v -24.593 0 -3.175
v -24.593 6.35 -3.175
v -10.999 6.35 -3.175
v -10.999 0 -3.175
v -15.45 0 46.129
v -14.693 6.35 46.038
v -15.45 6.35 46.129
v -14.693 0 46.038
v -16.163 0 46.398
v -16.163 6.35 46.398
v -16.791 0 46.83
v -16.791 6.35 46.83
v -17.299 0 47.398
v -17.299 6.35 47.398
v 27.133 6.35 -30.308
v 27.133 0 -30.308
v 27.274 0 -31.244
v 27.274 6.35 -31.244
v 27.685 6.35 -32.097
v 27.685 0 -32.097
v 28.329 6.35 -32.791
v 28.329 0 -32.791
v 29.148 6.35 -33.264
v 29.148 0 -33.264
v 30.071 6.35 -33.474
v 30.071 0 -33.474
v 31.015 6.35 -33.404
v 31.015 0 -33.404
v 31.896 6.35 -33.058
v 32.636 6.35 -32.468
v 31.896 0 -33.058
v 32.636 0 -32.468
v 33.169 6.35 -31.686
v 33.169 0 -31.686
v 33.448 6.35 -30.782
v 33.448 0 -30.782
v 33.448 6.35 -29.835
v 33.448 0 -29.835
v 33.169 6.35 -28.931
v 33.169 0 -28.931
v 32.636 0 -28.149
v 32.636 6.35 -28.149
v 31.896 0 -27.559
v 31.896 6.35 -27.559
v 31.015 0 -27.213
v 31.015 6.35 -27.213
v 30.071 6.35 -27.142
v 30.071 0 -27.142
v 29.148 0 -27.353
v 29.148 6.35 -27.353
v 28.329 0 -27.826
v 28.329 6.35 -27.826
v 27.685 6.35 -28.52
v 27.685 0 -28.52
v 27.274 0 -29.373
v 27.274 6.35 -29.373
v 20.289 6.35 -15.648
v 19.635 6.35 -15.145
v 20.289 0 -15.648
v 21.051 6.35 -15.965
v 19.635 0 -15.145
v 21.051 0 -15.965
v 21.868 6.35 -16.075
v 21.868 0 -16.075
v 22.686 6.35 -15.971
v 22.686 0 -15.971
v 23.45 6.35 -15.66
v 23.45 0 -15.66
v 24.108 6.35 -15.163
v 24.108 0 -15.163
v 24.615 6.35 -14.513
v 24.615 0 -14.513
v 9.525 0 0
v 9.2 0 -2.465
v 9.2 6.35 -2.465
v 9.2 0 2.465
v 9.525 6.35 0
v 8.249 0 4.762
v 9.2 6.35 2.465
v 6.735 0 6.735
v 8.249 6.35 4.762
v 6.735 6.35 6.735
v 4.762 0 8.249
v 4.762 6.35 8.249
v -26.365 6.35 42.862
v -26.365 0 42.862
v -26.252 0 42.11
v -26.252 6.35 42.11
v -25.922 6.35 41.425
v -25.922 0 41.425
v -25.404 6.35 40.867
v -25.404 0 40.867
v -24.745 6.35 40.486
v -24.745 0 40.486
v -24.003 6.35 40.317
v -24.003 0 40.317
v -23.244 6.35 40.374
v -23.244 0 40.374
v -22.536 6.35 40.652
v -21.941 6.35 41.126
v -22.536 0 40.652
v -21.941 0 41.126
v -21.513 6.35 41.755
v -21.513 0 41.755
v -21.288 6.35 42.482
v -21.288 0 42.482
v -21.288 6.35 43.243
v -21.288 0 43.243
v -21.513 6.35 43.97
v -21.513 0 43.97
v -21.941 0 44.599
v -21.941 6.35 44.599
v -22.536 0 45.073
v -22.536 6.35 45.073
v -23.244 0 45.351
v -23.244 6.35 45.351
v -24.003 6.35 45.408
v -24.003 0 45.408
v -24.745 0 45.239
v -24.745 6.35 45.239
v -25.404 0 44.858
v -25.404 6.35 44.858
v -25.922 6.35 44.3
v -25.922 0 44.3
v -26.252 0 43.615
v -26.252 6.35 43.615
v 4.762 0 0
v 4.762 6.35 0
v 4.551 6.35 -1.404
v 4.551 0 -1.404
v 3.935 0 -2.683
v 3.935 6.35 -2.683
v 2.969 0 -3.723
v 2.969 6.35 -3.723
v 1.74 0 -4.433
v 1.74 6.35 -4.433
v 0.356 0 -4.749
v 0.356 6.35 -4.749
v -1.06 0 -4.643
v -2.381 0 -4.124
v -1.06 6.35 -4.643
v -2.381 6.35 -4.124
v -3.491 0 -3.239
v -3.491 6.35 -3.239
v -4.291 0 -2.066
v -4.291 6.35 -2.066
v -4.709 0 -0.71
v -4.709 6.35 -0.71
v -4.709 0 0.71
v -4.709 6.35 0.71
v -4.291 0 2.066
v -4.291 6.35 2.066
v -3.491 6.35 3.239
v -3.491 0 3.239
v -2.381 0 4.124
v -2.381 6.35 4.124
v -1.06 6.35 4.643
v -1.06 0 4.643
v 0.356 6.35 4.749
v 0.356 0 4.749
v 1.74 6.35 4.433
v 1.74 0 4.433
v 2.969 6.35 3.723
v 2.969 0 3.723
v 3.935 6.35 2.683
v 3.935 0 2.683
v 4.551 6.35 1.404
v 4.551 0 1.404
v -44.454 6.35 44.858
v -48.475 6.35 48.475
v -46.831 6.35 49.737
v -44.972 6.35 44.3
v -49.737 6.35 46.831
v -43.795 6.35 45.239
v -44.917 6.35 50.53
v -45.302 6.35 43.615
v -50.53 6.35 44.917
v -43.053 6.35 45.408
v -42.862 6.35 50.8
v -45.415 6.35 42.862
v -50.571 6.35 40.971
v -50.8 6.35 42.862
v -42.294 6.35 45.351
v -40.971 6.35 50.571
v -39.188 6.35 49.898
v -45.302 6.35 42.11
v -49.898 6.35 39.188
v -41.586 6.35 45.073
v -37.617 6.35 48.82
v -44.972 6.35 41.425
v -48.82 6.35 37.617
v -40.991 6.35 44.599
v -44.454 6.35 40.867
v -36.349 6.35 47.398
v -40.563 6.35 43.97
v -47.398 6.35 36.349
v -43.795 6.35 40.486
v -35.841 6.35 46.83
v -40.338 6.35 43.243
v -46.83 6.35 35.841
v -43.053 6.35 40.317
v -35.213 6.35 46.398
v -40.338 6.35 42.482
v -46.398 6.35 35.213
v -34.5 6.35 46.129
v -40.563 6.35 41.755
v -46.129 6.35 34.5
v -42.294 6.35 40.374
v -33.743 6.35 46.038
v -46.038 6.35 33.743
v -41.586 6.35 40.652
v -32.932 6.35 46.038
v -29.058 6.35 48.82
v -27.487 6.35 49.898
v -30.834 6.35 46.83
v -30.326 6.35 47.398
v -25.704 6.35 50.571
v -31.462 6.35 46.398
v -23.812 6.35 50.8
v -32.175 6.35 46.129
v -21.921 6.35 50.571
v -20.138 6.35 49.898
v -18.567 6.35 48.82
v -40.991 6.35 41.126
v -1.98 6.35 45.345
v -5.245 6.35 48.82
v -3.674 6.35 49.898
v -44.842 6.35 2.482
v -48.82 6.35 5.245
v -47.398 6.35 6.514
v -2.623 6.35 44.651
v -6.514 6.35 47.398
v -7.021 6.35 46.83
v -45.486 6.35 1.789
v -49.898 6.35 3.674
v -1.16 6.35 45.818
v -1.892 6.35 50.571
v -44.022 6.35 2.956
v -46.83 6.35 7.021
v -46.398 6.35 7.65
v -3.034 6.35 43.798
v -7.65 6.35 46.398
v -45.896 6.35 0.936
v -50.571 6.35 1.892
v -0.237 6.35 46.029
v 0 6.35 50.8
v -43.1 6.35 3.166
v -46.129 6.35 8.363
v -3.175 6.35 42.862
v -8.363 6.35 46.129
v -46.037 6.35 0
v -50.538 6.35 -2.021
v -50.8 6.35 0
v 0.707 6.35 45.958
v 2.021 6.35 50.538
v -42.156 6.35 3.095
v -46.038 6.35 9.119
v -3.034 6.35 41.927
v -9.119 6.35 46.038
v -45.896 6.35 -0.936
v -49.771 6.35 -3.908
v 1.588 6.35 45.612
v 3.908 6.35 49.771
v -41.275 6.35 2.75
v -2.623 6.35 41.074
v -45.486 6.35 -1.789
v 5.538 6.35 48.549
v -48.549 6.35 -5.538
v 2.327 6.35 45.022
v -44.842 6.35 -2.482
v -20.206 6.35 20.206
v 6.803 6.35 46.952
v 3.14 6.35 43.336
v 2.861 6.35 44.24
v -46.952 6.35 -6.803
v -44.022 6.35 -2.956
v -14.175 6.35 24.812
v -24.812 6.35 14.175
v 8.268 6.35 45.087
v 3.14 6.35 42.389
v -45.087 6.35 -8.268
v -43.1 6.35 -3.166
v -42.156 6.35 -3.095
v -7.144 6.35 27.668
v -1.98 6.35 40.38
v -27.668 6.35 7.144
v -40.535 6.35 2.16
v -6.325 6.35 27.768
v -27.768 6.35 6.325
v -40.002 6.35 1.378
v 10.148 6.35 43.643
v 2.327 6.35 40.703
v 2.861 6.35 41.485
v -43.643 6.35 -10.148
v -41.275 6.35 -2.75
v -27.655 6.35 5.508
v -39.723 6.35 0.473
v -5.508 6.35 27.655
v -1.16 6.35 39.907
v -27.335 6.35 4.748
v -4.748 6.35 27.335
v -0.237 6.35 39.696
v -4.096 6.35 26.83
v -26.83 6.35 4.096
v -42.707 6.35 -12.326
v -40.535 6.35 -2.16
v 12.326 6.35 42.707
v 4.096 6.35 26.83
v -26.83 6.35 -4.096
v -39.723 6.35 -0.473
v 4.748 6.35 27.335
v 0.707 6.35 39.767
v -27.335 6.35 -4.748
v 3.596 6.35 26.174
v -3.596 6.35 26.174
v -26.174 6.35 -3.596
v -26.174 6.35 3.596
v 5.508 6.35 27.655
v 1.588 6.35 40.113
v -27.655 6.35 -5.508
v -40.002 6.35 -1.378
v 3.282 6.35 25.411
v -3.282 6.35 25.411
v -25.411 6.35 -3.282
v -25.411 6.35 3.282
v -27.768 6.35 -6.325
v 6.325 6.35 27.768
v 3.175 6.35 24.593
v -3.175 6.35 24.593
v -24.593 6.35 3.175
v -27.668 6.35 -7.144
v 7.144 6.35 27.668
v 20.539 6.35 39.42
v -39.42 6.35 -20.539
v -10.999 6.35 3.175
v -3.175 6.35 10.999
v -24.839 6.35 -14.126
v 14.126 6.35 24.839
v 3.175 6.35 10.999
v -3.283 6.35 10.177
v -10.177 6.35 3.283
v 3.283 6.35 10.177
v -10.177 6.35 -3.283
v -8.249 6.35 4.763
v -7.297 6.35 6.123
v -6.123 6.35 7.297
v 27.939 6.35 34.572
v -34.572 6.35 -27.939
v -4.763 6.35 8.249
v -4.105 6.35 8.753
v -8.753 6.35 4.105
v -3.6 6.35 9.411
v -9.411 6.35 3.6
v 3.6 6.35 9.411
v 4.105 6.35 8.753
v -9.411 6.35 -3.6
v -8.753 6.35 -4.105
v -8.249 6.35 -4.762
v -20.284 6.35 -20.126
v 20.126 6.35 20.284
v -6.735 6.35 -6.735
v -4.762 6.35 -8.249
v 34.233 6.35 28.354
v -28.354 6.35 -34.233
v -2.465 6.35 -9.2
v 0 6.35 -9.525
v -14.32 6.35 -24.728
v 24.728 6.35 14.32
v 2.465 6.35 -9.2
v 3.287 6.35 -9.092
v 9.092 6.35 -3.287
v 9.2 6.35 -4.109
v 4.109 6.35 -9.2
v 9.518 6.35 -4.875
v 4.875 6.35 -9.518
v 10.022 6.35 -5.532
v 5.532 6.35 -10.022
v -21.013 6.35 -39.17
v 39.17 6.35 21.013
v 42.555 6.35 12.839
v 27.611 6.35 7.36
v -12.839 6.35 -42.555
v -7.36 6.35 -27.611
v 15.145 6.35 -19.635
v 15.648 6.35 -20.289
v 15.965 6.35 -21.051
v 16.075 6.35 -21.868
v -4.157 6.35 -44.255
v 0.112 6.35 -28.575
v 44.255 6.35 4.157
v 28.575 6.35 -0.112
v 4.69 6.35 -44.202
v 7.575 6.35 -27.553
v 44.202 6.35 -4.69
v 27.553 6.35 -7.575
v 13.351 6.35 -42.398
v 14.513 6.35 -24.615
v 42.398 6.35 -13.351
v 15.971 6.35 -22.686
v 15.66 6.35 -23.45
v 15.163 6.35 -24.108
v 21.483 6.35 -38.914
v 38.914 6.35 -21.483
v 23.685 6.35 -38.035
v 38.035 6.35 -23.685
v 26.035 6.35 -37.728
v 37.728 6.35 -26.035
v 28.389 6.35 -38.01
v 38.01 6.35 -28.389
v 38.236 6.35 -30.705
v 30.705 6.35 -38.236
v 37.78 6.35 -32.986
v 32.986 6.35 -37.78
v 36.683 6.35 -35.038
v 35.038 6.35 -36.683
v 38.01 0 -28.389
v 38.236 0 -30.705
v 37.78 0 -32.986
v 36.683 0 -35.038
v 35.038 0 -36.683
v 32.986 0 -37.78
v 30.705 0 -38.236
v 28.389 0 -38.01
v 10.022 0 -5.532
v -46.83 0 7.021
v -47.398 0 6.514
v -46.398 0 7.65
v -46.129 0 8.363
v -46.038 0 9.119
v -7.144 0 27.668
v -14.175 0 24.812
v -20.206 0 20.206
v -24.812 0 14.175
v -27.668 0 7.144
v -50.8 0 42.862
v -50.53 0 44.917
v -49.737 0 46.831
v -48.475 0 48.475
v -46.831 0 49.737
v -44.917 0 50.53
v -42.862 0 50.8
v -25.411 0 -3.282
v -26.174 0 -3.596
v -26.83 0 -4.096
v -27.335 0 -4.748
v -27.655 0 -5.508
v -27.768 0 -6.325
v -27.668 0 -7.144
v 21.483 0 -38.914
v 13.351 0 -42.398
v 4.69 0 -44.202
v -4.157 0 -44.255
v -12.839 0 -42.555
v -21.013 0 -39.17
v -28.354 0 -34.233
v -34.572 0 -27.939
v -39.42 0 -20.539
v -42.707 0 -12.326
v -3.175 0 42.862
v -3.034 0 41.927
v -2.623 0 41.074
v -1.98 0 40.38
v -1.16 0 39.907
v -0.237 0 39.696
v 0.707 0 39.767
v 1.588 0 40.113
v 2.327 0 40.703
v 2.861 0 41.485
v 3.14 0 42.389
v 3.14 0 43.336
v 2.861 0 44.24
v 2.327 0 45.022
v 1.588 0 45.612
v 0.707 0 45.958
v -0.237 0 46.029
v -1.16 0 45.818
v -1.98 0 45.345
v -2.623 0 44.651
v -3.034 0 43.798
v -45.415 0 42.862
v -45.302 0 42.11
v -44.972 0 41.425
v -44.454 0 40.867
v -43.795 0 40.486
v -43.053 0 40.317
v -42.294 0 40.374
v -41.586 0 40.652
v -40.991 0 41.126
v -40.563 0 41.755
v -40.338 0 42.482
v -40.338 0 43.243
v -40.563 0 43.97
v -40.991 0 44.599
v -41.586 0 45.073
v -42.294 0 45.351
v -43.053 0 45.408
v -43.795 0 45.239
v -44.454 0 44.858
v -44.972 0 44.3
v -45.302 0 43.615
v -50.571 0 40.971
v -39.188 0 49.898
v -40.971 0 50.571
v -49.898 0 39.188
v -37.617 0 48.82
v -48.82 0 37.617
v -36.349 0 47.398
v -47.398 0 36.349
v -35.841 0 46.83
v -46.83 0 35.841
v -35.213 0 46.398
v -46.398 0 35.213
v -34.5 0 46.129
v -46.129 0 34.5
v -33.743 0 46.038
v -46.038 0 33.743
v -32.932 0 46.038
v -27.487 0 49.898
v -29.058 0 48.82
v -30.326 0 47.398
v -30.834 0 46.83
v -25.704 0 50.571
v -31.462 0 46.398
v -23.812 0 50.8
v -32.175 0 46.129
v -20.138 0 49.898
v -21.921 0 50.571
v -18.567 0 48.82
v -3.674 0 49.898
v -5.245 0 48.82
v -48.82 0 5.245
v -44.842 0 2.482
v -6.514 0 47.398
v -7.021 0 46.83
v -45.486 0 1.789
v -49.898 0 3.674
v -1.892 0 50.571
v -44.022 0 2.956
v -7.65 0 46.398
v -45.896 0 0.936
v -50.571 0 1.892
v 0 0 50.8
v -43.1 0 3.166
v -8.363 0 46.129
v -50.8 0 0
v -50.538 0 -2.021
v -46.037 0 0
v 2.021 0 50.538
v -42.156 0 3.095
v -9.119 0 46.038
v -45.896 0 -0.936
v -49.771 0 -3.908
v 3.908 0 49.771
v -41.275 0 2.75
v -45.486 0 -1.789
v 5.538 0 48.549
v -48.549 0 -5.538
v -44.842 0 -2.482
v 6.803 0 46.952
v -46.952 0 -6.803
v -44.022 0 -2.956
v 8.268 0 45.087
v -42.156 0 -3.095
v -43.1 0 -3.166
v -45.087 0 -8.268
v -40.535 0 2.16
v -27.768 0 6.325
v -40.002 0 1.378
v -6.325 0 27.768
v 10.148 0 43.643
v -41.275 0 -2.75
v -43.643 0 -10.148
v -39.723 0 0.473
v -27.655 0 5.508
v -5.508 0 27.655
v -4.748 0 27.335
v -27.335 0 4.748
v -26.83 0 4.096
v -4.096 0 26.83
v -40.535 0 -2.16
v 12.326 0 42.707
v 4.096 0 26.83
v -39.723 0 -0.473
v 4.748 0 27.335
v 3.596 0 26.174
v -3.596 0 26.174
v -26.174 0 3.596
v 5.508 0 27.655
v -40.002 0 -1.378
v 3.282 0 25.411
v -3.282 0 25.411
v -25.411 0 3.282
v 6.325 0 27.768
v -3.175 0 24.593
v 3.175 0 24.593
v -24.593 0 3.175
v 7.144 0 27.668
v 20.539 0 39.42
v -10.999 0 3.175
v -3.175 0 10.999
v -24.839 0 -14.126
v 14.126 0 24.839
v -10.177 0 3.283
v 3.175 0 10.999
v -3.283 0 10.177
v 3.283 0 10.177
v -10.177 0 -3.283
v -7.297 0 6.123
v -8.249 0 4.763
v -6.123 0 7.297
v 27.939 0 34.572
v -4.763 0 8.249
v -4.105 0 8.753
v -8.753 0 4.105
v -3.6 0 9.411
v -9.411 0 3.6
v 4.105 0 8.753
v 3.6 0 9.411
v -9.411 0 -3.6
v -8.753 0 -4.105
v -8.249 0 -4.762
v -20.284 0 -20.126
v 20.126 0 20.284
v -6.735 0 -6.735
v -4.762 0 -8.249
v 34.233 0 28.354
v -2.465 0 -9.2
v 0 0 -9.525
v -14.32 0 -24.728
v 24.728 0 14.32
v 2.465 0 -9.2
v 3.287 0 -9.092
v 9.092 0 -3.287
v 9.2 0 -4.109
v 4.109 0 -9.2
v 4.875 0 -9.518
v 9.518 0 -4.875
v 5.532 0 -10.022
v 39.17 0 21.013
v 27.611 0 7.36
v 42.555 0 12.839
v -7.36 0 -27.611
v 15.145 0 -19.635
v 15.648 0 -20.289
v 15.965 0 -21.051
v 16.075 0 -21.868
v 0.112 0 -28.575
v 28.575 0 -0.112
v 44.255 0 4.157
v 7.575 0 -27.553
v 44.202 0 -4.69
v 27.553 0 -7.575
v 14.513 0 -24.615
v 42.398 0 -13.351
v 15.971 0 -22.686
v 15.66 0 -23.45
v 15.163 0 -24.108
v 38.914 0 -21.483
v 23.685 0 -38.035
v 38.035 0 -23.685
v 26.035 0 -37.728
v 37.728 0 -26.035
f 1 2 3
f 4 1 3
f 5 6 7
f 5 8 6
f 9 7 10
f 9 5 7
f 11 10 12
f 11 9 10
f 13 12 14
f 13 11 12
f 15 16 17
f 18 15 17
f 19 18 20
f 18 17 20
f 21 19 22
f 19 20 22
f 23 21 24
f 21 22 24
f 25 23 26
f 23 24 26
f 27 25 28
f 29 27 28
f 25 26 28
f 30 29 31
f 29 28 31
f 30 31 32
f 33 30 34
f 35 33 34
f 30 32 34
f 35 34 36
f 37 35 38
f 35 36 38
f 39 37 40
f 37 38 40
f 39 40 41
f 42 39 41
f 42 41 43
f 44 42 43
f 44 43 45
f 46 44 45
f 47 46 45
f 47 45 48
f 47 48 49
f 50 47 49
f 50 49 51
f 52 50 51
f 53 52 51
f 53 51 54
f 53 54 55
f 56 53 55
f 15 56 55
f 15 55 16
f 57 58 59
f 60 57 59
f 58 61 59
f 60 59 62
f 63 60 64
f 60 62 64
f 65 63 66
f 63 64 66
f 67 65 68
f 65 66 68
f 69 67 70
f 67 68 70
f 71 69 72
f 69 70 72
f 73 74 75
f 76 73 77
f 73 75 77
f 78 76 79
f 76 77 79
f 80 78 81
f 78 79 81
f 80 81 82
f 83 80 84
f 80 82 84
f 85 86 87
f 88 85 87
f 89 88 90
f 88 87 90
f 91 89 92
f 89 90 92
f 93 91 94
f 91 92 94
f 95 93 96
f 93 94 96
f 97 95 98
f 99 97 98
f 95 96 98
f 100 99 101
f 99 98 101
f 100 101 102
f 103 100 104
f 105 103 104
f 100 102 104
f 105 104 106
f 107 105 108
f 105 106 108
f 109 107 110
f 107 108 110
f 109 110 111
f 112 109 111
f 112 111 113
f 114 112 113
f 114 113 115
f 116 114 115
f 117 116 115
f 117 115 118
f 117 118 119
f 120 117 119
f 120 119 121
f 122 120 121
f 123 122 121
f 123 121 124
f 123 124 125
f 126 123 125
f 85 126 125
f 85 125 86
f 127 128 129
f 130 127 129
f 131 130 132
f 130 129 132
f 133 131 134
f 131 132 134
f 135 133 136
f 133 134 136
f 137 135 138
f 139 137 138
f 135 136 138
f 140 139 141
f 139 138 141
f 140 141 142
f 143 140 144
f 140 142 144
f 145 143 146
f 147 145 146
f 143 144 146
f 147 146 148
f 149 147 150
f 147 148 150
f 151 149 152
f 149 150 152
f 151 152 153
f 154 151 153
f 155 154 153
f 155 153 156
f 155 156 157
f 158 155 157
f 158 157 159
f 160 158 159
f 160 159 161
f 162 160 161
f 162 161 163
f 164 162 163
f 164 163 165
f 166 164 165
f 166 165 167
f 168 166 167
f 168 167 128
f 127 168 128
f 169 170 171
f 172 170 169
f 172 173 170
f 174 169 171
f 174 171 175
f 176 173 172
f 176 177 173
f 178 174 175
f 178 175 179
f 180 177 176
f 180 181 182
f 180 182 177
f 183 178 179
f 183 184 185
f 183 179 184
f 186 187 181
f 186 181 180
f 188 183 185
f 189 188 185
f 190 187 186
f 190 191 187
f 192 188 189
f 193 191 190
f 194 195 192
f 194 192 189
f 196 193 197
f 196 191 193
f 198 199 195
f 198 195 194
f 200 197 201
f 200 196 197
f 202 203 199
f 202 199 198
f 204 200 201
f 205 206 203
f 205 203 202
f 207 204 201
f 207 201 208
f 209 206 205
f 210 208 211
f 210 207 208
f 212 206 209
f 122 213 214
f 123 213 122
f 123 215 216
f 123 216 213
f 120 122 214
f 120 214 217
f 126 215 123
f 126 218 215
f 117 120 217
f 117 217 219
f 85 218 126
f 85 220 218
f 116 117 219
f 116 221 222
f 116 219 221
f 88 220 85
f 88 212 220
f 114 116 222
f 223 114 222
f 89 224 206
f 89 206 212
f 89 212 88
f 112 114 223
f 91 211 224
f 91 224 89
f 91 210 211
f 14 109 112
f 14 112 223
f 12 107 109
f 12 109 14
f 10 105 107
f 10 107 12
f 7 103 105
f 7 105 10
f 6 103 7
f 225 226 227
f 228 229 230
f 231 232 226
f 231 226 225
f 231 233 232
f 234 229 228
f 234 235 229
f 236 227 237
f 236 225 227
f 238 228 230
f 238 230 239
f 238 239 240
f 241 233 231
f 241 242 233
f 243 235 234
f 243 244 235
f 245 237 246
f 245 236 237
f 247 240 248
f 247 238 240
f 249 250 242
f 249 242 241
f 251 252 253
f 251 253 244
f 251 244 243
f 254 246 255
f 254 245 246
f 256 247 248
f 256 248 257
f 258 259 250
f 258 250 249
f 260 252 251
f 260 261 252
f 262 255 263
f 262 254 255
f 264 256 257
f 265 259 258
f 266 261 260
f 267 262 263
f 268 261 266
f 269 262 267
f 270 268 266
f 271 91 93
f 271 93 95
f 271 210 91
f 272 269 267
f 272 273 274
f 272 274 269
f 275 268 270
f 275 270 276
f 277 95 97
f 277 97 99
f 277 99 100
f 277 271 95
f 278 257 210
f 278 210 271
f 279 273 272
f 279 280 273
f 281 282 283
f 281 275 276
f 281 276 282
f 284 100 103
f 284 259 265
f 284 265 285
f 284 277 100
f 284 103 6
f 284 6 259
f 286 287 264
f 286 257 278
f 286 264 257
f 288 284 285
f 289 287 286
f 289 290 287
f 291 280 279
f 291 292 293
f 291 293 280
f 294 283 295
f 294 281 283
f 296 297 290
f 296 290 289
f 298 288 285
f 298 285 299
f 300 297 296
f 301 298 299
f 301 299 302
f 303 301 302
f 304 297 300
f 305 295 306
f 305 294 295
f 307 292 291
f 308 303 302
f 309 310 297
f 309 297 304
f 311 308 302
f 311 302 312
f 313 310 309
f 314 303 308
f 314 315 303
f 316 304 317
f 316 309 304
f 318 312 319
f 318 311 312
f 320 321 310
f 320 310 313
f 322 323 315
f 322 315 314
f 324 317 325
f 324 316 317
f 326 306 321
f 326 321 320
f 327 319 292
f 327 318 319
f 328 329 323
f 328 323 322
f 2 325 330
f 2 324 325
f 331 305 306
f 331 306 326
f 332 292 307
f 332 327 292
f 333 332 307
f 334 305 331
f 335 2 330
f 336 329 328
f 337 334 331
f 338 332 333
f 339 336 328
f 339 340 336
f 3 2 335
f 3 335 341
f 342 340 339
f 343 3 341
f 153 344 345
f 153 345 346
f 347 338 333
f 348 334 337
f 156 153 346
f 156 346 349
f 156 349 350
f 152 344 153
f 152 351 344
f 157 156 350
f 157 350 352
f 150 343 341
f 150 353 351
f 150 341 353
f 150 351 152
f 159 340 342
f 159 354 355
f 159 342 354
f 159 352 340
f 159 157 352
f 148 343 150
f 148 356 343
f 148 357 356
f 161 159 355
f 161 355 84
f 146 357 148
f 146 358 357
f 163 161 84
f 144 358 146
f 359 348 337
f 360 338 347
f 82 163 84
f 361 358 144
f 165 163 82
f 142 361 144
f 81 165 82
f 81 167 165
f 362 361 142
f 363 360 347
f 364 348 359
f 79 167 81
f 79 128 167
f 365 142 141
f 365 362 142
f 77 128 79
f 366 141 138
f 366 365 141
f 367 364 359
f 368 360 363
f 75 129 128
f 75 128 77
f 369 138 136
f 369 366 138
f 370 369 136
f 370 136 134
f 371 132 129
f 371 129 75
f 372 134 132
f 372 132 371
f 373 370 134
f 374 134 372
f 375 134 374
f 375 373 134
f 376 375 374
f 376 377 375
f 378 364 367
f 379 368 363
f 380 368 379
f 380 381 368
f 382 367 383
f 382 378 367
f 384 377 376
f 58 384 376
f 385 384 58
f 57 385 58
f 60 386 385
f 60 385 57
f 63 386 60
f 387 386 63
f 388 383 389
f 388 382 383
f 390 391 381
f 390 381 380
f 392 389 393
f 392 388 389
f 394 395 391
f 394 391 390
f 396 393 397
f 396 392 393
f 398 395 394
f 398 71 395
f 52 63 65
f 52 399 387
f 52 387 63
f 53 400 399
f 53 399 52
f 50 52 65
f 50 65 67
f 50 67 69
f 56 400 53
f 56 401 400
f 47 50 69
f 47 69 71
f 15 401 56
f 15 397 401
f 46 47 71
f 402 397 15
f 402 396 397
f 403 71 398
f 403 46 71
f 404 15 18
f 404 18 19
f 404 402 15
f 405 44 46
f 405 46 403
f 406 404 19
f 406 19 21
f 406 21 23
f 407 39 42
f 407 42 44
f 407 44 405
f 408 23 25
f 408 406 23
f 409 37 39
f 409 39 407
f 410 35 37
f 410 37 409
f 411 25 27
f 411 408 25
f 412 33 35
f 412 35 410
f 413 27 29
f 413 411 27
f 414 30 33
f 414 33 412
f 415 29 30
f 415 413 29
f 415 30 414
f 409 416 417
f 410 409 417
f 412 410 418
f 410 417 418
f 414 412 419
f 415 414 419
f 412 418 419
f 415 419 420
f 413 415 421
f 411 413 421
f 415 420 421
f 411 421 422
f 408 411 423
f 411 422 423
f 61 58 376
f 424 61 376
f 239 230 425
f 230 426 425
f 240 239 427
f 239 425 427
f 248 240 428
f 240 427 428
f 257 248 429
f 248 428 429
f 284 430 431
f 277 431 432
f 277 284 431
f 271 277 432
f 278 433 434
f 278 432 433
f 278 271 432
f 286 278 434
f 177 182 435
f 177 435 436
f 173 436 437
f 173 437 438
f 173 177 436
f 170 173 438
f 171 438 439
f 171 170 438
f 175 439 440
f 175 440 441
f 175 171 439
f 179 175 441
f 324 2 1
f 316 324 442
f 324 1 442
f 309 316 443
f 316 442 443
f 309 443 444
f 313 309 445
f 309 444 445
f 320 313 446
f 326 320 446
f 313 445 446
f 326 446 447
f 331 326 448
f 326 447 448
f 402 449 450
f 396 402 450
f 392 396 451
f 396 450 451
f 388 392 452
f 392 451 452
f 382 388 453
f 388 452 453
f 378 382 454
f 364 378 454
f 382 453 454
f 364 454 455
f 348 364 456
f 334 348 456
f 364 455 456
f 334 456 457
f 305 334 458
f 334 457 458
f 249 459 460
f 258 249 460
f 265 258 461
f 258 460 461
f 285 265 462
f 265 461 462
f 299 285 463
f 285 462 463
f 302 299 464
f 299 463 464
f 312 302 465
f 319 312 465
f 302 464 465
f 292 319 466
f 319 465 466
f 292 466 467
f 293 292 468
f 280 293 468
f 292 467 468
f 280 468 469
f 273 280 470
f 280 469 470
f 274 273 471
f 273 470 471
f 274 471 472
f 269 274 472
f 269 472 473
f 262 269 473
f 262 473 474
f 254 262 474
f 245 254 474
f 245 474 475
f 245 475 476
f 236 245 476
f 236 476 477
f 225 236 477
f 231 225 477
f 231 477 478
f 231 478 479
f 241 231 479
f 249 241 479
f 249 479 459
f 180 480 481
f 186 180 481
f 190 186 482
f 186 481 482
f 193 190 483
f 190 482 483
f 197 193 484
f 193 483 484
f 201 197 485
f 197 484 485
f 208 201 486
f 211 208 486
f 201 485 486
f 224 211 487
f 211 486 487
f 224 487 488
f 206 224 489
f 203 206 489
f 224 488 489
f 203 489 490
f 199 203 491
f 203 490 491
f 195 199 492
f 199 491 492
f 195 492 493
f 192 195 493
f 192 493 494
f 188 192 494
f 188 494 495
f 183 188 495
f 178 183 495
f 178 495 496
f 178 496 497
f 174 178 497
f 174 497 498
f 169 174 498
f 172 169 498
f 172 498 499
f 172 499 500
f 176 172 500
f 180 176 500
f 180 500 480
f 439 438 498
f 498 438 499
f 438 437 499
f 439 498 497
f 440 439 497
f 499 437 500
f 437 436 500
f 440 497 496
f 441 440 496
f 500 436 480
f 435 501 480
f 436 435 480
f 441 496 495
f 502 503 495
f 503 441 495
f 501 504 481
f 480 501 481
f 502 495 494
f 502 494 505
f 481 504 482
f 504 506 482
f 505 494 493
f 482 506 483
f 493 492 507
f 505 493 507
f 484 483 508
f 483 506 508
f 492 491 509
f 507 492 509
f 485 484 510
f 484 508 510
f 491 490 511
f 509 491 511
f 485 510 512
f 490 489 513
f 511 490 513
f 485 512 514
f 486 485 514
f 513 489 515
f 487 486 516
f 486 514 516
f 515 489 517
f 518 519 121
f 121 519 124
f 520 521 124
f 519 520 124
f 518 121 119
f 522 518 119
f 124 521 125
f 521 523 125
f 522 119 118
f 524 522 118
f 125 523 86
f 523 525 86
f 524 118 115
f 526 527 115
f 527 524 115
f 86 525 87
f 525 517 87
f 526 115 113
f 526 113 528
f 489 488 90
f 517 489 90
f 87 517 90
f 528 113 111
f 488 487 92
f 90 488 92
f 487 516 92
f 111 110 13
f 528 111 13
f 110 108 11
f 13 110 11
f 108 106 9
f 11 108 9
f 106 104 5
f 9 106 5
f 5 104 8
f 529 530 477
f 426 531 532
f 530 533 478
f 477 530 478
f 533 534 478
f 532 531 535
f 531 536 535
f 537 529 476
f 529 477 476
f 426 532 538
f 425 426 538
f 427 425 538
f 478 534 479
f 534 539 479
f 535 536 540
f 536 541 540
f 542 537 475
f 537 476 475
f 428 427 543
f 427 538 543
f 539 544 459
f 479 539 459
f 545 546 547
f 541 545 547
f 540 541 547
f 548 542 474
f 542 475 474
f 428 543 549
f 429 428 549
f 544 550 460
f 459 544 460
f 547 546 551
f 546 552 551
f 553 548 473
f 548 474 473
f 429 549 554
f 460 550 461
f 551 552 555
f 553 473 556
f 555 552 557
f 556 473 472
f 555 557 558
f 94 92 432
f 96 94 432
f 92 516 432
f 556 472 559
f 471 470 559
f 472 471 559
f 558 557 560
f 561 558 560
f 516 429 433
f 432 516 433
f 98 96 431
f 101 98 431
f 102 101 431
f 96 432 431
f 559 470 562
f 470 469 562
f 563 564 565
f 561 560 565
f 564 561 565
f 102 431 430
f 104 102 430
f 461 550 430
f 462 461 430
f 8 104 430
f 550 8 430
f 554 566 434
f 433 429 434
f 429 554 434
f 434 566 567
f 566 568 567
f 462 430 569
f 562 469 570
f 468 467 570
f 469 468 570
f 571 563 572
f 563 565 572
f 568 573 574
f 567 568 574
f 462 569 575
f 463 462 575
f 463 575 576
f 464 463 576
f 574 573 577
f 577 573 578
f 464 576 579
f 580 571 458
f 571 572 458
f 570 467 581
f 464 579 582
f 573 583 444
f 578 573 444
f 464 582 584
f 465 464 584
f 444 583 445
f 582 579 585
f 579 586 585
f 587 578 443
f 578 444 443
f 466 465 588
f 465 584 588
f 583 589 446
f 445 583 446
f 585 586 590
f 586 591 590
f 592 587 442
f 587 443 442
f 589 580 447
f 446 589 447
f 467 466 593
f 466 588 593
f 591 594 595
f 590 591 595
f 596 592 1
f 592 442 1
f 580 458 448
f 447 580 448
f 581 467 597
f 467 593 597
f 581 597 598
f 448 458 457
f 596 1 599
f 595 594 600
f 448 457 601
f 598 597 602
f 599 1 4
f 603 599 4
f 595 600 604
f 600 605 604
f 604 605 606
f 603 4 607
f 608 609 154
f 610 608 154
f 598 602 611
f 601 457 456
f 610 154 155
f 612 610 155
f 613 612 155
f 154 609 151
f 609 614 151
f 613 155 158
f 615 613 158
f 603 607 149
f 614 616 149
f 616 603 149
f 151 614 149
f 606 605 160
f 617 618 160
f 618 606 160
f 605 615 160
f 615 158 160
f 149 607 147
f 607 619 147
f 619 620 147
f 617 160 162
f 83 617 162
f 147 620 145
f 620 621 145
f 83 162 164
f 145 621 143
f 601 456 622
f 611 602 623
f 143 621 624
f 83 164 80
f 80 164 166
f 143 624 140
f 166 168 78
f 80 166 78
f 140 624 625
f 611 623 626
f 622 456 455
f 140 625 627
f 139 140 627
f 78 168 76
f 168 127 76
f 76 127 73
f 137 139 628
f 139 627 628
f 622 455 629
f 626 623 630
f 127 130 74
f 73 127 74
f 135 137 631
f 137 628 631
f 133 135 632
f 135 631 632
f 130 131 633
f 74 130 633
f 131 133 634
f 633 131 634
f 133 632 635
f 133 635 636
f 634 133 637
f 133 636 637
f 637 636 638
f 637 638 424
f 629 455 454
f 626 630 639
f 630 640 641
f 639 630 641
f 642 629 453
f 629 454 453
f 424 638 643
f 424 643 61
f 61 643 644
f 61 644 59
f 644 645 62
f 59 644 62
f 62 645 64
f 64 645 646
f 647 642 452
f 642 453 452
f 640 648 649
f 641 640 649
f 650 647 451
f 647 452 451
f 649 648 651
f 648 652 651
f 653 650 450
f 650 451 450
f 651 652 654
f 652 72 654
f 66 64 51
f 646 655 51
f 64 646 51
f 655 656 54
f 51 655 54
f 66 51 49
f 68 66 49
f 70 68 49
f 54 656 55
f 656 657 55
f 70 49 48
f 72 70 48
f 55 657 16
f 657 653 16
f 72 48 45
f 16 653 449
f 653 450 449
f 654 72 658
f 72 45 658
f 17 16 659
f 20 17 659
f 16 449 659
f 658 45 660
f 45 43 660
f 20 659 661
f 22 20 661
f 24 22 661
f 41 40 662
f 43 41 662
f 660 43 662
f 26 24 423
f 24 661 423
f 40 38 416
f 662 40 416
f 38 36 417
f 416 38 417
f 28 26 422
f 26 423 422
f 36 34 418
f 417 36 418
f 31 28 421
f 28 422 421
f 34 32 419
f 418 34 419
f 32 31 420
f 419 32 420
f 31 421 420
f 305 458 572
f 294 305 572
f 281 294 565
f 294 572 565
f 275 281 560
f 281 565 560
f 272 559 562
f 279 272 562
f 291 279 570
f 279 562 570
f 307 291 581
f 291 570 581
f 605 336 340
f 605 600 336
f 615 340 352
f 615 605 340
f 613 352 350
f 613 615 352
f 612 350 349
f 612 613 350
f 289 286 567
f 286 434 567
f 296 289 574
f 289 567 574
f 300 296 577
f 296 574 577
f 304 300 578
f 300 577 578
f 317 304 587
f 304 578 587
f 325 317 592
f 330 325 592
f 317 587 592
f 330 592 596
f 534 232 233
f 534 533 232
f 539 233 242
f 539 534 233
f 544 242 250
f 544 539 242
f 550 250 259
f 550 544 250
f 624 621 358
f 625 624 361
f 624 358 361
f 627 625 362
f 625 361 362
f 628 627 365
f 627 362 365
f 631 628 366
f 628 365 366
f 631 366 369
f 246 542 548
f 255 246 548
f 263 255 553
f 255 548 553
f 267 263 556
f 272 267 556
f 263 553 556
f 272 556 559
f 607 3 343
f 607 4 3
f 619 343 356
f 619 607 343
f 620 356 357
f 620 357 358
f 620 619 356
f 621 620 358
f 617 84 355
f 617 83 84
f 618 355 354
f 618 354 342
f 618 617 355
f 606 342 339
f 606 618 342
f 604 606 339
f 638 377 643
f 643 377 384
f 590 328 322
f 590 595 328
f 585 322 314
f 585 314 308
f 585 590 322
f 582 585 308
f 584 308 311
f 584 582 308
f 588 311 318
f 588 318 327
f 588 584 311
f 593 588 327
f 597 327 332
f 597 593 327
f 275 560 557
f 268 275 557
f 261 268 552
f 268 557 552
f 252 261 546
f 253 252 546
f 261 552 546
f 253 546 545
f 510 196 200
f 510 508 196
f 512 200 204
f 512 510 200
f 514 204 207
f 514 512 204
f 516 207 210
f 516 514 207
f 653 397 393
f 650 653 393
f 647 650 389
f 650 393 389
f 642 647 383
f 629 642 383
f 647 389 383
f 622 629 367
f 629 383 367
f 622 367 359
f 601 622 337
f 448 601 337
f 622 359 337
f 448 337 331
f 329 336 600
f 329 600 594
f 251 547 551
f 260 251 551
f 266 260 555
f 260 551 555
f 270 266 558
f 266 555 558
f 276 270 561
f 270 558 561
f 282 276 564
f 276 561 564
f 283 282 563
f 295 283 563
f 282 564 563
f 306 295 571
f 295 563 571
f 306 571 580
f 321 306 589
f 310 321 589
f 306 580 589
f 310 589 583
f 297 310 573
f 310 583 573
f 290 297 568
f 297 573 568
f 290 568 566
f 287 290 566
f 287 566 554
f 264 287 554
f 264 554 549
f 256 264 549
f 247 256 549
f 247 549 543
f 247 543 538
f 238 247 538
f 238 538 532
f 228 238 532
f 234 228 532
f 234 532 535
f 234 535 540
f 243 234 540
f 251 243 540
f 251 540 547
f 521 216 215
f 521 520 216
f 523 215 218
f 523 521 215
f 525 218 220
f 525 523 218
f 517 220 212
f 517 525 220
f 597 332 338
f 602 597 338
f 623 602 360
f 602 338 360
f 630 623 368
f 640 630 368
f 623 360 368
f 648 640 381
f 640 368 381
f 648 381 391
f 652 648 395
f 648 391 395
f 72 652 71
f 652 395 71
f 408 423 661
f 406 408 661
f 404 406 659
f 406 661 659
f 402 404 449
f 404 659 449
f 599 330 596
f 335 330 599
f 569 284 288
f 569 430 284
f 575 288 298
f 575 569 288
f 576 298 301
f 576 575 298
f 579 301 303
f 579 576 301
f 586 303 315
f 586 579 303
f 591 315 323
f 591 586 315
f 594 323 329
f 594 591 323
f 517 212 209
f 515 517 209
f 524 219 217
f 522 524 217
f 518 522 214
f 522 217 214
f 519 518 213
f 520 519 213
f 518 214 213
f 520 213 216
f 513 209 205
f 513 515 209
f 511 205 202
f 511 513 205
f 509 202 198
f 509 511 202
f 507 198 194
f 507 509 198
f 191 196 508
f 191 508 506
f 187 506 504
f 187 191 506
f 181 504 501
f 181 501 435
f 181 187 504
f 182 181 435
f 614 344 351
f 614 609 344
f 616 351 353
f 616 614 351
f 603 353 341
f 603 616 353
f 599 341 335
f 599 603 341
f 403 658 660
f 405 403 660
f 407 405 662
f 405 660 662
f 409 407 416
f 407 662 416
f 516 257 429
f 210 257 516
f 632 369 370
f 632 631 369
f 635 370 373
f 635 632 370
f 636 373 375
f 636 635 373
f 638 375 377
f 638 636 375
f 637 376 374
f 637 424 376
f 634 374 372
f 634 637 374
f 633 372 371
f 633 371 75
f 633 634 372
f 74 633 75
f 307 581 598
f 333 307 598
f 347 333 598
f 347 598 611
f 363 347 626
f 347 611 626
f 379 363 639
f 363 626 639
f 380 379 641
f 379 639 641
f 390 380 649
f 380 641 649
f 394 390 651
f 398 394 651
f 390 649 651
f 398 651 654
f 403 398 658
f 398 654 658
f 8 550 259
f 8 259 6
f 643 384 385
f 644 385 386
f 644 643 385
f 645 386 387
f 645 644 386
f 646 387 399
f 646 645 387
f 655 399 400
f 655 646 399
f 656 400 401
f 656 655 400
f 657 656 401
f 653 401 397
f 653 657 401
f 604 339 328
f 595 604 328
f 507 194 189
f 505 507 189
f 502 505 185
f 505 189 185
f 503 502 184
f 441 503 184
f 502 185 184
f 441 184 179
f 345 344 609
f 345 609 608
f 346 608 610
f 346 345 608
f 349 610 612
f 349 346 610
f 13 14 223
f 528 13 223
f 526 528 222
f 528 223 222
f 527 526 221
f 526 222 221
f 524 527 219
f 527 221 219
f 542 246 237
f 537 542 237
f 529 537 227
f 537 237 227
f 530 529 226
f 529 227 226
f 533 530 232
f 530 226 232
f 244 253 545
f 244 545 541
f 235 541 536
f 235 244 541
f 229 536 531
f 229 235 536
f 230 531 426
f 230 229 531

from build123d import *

# Parameters (mm, degrees)
BOSS_EXTRUDE1_DEPTH         = 6.35
SKETCH2_R                   = 4.7625
CUT_EXTRUDE1_DEPTH          = 7.35
F_1_4_0_25_DIAMETER_HOLE1_D = 6.35
CUT_EXTRUDE2_DEPTH          = 7.35
FILLET1_R                   = 3.175
BOSS_EXTRUDE2_DEPTH         = 6.35
F_10_CLEARANCE_HOLE1_D      = 5.1054
CUT_EXTRUDE5_DEPTH          = 6.35
FILLET3_R                   = 3.175


with BuildPart() as part:
    # Sketch1 → Boss-Extrude1 (new body)
    with BuildSketch(Plane(origin=(0, 0, 0), x_dir=(1, 0, 0), z_dir=(0, 1, 0))):
        with BuildLine():
            ThreePointArc((-42.706862745, -12.325841735), (-31.430896424, -31.430896424), (-12.325841735, -42.706862745))
            ThreePointArc((-12.325841735, -42.706862745), (-9.162618669, -44.306267621), (-6.803224334, -46.951515152))
            ThreePointArc((-6.803224334, -46.951515152), (0, -50.8), (6.803224334, -46.951515152))
            ThreePointArc((6.803224334, -46.951515152), (9.162618669, -44.306267621), (12.325841735, -42.706862745))
            ThreePointArc((12.325841735, -42.706862745), (41.06644522, -17.010278569), (38.913998525, 21.482625976))
            ThreePointArc((38.913998525, 21.482625976), (37.808212078, 24.85031249), (38.010340811, 28.38912869))
            ThreePointArc((38.010340811, 28.38912869), (35.921024484, 35.921024484), (28.38912869, 38.010340811))
            ThreePointArc((28.38912869, 38.010340811), (24.85031249, 37.808212078), (21.482625976, 38.913998525))
            ThreePointArc((21.482625976, 38.913998525), (-17.010278569, 41.06644522), (-42.706862745, 12.325841735))
            ThreePointArc((-42.706862745, 12.325841735), (-44.306267621, 9.162618669), (-46.951515152, 6.803224334))
            ThreePointArc((-46.951515152, 6.803224334), (-50.8, 0), (-46.951515152, -6.803224334))
            ThreePointArc((-46.951515152, -6.803224334), (-44.306267621, -9.162618669), (-42.706862745, -12.325841735))
        make_face()
    extrude(amount=BOSS_EXTRUDE1_DEPTH)

    # Sketch2 → Cut-Extrude1 (cut, through all)
    with BuildSketch(Plane(origin=(0, 6.35, 0), x_dir=(1, 0, 0), z_dir=(0, 1, 0))):
        Circle(SKETCH2_R)
    extrude(amount=-CUT_EXTRUDE1_DEPTH, mode=Mode.SUBTRACT)

    # 1/4 (0.25) Diameter Hole1 (through all)
    with Locations(Plane(origin=(0, 6.35, 0), x_dir=(1, 0, 0), z_dir=(0, 1, 0))):
        with Locations((-42.8625, 0), (30.308364409, 30.308364409), (0, -42.8625)):
            Hole(F_1_4_0_25_DIAMETER_HOLE1_D / 2)

    # Sketch5 → Cut-Extrude2 (cut, through all)
    with BuildSketch(Plane(origin=(0, 6.35, 0), x_dir=(1, 0, 0), z_dir=(0, 1, 0))):
        with BuildLine():
            Line((-28.398063314, 3.175), (-8.980256121, 3.175))
            ThreePointArc((-8.980256121, 3.175), (-3.645059693, 8.799952547), (4.10493597, 8.59506403))
            Line((4.10493597, 8.59506403), (17.835399112, 22.325527172))
            ThreePointArc((17.835399112, 22.325527172), (-10.93517908, 26.399857642), (-28.398063314, 3.175))
        make_face()
        with BuildLine():
            Line((-28.398063314, -3.175), (-8.980256121, -3.175))
            ThreePointArc((-8.980256121, -3.175), (-6.735192091, -6.735192091), (-3.175, -8.980256121))
            Line((-3.175, -8.980256121), (-3.175, -28.398063314))
            ThreePointArc((-3.175, -28.398063314), (-20.205576272, -20.205576272), (-28.398063314, -3.175))
        make_face()
        with BuildLine():
            Line((22.325527172, 17.835399112), (8.59506403, 4.10493597))
            ThreePointArc((8.59506403, 4.10493597), (8.799952547, -3.645059693), (3.175, -8.980256121))
            Line((3.175, -8.980256121), (3.175, -28.398063314))
            ThreePointArc((3.175, -28.398063314), (26.399857642, -10.93517908), (22.325527172, 17.835399112))
        make_face()
    extrude(amount=-CUT_EXTRUDE2_DEPTH, mode=Mode.SUBTRACT)

    # Fillet1
    fillet1_edges = [part.edges().sort_by_distance(p)[0] for p in [
        (22.325527172, 3.175, -17.835399112),
        (3.175, 3.175, 28.398063314),
        (3.175, 3.175, 8.980256121),
        (8.59506403, 3.175, -4.10493597),
        (-3.175, 3.175, 28.398063314),
        (-28.398063314, 3.175, 3.175),
        (-8.980256121, 3.175, 3.175),
        (-3.175, 3.175, 8.980256121),
        (-28.398063314, 3.175, -3.175),
        (17.835399112, 3.175, -22.325527172),
        (4.10493597, 3.175, -8.59506403),
        (-8.980256121, 3.175, -3.175),
    ]]
    fillet(fillet1_edges, radius=FILLET1_R)

    # Sketch8 → Boss-Extrude2 (add)
    with BuildSketch(Plane(origin=(0, 6.35, 0), x_dir=(1, 0, 0), z_dir=(0, 1, 0))):
        with BuildLine():
            Line((-50.8, 0), (-50.8, -42.8625))
            ThreePointArc((-50.8, -42.8625), (-48.475160076, -48.475160076), (-42.8625, -50.8))
            Line((-42.8625, -50.8), (0, -50.8))
            ThreePointArc((0, -50.8), (-3.908154839, -49.771206971), (-6.803224334, -46.951515152))
            ThreePointArc((-6.803224334, -46.951515152), (-9.162618669, -44.306267621), (-12.325841735, -42.706862745))
            ThreePointArc((-12.325841735, -42.706862745), (-31.430896424, -31.430896424), (-42.706862745, -12.325841735))
            ThreePointArc((-42.706862745, -12.325841735), (-44.306267621, -9.162618669), (-46.951515152, -6.803224334))
            ThreePointArc((-46.951515152, -6.803224334), (-49.771206971, -3.908154839), (-50.8, 0))
        make_face()
    extrude(amount=-BOSS_EXTRUDE2_DEPTH)

    # #10 Clearance Hole1 (through all)
    with Locations(Plane(origin=(0, 6.35, 0), x_dir=(1, 0, 0), z_dir=(0, 1, 0))):
        with Locations((-42.8625, -42.8625), (-23.8125, -42.8625)):
            Hole(F_10_CLEARANCE_HOLE1_D / 2)

    # Sketch15 → Cut-Extrude5 (cut)
    with BuildSketch(Plane(origin=(0, 6.35, 0), x_dir=(1, 0, 0), z_dir=(0, 1, 0))):
        with BuildLine():
            ThreePointArc((-46.0375, -35.587661084), (-49.503488961, -38.5149522), (-50.8, -42.8625))
            Line((-50.8, -42.8625), (-50.8, 0))
            ThreePointArc((-50.8, 0), (-49.503488961, -4.3475478), (-46.0375, -7.274838916))
            Line((-46.0375, -7.274838916), (-46.0375, -35.587661084))
        make_face()
        with BuildLine():
            Line((-31.087338916, -46.0375), (-35.587661084, -46.0375))
            ThreePointArc((-35.587661084, -46.0375), (-38.5149522, -49.503488961), (-42.8625, -50.8))
            Line((-42.8625, -50.8), (-23.8125, -50.8))
            ThreePointArc((-23.8125, -50.8), (-28.1600478, -49.503488961), (-31.087338916, -46.0375))
        make_face()
        with BuildLine():
            ThreePointArc((-16.537661084, -46.0375), (-19.4649522, -49.503488961), (-23.8125, -50.8))
            Line((-23.8125, -50.8), (0, -50.8))
            ThreePointArc((0, -50.8), (-4.3475478, -49.503488961), (-7.274838916, -46.0375))
            Line((-7.274838916, -46.0375), (-16.537661084, -46.0375))
        make_face()
    extrude(amount=-CUT_EXTRUDE5_DEPTH, mode=Mode.SUBTRACT)

    # Fillet3
    fillet3_edges = [part.edges().sort_by_distance(p)[0] for p in [
        (-46.0375, 3.175, 35.587661084),
        (-46.0375, 3.175, 7.274838916),
        (-35.587661084, 3.175, 46.0375),
        (-31.087338916, 3.175, 46.0375),
        (-16.537661084, 3.175, 46.0375),
        (-7.274838916, 3.175, 46.0375),
    ]]
    fillet(fillet3_edges, radius=FILLET3_R)


solid = part.part
